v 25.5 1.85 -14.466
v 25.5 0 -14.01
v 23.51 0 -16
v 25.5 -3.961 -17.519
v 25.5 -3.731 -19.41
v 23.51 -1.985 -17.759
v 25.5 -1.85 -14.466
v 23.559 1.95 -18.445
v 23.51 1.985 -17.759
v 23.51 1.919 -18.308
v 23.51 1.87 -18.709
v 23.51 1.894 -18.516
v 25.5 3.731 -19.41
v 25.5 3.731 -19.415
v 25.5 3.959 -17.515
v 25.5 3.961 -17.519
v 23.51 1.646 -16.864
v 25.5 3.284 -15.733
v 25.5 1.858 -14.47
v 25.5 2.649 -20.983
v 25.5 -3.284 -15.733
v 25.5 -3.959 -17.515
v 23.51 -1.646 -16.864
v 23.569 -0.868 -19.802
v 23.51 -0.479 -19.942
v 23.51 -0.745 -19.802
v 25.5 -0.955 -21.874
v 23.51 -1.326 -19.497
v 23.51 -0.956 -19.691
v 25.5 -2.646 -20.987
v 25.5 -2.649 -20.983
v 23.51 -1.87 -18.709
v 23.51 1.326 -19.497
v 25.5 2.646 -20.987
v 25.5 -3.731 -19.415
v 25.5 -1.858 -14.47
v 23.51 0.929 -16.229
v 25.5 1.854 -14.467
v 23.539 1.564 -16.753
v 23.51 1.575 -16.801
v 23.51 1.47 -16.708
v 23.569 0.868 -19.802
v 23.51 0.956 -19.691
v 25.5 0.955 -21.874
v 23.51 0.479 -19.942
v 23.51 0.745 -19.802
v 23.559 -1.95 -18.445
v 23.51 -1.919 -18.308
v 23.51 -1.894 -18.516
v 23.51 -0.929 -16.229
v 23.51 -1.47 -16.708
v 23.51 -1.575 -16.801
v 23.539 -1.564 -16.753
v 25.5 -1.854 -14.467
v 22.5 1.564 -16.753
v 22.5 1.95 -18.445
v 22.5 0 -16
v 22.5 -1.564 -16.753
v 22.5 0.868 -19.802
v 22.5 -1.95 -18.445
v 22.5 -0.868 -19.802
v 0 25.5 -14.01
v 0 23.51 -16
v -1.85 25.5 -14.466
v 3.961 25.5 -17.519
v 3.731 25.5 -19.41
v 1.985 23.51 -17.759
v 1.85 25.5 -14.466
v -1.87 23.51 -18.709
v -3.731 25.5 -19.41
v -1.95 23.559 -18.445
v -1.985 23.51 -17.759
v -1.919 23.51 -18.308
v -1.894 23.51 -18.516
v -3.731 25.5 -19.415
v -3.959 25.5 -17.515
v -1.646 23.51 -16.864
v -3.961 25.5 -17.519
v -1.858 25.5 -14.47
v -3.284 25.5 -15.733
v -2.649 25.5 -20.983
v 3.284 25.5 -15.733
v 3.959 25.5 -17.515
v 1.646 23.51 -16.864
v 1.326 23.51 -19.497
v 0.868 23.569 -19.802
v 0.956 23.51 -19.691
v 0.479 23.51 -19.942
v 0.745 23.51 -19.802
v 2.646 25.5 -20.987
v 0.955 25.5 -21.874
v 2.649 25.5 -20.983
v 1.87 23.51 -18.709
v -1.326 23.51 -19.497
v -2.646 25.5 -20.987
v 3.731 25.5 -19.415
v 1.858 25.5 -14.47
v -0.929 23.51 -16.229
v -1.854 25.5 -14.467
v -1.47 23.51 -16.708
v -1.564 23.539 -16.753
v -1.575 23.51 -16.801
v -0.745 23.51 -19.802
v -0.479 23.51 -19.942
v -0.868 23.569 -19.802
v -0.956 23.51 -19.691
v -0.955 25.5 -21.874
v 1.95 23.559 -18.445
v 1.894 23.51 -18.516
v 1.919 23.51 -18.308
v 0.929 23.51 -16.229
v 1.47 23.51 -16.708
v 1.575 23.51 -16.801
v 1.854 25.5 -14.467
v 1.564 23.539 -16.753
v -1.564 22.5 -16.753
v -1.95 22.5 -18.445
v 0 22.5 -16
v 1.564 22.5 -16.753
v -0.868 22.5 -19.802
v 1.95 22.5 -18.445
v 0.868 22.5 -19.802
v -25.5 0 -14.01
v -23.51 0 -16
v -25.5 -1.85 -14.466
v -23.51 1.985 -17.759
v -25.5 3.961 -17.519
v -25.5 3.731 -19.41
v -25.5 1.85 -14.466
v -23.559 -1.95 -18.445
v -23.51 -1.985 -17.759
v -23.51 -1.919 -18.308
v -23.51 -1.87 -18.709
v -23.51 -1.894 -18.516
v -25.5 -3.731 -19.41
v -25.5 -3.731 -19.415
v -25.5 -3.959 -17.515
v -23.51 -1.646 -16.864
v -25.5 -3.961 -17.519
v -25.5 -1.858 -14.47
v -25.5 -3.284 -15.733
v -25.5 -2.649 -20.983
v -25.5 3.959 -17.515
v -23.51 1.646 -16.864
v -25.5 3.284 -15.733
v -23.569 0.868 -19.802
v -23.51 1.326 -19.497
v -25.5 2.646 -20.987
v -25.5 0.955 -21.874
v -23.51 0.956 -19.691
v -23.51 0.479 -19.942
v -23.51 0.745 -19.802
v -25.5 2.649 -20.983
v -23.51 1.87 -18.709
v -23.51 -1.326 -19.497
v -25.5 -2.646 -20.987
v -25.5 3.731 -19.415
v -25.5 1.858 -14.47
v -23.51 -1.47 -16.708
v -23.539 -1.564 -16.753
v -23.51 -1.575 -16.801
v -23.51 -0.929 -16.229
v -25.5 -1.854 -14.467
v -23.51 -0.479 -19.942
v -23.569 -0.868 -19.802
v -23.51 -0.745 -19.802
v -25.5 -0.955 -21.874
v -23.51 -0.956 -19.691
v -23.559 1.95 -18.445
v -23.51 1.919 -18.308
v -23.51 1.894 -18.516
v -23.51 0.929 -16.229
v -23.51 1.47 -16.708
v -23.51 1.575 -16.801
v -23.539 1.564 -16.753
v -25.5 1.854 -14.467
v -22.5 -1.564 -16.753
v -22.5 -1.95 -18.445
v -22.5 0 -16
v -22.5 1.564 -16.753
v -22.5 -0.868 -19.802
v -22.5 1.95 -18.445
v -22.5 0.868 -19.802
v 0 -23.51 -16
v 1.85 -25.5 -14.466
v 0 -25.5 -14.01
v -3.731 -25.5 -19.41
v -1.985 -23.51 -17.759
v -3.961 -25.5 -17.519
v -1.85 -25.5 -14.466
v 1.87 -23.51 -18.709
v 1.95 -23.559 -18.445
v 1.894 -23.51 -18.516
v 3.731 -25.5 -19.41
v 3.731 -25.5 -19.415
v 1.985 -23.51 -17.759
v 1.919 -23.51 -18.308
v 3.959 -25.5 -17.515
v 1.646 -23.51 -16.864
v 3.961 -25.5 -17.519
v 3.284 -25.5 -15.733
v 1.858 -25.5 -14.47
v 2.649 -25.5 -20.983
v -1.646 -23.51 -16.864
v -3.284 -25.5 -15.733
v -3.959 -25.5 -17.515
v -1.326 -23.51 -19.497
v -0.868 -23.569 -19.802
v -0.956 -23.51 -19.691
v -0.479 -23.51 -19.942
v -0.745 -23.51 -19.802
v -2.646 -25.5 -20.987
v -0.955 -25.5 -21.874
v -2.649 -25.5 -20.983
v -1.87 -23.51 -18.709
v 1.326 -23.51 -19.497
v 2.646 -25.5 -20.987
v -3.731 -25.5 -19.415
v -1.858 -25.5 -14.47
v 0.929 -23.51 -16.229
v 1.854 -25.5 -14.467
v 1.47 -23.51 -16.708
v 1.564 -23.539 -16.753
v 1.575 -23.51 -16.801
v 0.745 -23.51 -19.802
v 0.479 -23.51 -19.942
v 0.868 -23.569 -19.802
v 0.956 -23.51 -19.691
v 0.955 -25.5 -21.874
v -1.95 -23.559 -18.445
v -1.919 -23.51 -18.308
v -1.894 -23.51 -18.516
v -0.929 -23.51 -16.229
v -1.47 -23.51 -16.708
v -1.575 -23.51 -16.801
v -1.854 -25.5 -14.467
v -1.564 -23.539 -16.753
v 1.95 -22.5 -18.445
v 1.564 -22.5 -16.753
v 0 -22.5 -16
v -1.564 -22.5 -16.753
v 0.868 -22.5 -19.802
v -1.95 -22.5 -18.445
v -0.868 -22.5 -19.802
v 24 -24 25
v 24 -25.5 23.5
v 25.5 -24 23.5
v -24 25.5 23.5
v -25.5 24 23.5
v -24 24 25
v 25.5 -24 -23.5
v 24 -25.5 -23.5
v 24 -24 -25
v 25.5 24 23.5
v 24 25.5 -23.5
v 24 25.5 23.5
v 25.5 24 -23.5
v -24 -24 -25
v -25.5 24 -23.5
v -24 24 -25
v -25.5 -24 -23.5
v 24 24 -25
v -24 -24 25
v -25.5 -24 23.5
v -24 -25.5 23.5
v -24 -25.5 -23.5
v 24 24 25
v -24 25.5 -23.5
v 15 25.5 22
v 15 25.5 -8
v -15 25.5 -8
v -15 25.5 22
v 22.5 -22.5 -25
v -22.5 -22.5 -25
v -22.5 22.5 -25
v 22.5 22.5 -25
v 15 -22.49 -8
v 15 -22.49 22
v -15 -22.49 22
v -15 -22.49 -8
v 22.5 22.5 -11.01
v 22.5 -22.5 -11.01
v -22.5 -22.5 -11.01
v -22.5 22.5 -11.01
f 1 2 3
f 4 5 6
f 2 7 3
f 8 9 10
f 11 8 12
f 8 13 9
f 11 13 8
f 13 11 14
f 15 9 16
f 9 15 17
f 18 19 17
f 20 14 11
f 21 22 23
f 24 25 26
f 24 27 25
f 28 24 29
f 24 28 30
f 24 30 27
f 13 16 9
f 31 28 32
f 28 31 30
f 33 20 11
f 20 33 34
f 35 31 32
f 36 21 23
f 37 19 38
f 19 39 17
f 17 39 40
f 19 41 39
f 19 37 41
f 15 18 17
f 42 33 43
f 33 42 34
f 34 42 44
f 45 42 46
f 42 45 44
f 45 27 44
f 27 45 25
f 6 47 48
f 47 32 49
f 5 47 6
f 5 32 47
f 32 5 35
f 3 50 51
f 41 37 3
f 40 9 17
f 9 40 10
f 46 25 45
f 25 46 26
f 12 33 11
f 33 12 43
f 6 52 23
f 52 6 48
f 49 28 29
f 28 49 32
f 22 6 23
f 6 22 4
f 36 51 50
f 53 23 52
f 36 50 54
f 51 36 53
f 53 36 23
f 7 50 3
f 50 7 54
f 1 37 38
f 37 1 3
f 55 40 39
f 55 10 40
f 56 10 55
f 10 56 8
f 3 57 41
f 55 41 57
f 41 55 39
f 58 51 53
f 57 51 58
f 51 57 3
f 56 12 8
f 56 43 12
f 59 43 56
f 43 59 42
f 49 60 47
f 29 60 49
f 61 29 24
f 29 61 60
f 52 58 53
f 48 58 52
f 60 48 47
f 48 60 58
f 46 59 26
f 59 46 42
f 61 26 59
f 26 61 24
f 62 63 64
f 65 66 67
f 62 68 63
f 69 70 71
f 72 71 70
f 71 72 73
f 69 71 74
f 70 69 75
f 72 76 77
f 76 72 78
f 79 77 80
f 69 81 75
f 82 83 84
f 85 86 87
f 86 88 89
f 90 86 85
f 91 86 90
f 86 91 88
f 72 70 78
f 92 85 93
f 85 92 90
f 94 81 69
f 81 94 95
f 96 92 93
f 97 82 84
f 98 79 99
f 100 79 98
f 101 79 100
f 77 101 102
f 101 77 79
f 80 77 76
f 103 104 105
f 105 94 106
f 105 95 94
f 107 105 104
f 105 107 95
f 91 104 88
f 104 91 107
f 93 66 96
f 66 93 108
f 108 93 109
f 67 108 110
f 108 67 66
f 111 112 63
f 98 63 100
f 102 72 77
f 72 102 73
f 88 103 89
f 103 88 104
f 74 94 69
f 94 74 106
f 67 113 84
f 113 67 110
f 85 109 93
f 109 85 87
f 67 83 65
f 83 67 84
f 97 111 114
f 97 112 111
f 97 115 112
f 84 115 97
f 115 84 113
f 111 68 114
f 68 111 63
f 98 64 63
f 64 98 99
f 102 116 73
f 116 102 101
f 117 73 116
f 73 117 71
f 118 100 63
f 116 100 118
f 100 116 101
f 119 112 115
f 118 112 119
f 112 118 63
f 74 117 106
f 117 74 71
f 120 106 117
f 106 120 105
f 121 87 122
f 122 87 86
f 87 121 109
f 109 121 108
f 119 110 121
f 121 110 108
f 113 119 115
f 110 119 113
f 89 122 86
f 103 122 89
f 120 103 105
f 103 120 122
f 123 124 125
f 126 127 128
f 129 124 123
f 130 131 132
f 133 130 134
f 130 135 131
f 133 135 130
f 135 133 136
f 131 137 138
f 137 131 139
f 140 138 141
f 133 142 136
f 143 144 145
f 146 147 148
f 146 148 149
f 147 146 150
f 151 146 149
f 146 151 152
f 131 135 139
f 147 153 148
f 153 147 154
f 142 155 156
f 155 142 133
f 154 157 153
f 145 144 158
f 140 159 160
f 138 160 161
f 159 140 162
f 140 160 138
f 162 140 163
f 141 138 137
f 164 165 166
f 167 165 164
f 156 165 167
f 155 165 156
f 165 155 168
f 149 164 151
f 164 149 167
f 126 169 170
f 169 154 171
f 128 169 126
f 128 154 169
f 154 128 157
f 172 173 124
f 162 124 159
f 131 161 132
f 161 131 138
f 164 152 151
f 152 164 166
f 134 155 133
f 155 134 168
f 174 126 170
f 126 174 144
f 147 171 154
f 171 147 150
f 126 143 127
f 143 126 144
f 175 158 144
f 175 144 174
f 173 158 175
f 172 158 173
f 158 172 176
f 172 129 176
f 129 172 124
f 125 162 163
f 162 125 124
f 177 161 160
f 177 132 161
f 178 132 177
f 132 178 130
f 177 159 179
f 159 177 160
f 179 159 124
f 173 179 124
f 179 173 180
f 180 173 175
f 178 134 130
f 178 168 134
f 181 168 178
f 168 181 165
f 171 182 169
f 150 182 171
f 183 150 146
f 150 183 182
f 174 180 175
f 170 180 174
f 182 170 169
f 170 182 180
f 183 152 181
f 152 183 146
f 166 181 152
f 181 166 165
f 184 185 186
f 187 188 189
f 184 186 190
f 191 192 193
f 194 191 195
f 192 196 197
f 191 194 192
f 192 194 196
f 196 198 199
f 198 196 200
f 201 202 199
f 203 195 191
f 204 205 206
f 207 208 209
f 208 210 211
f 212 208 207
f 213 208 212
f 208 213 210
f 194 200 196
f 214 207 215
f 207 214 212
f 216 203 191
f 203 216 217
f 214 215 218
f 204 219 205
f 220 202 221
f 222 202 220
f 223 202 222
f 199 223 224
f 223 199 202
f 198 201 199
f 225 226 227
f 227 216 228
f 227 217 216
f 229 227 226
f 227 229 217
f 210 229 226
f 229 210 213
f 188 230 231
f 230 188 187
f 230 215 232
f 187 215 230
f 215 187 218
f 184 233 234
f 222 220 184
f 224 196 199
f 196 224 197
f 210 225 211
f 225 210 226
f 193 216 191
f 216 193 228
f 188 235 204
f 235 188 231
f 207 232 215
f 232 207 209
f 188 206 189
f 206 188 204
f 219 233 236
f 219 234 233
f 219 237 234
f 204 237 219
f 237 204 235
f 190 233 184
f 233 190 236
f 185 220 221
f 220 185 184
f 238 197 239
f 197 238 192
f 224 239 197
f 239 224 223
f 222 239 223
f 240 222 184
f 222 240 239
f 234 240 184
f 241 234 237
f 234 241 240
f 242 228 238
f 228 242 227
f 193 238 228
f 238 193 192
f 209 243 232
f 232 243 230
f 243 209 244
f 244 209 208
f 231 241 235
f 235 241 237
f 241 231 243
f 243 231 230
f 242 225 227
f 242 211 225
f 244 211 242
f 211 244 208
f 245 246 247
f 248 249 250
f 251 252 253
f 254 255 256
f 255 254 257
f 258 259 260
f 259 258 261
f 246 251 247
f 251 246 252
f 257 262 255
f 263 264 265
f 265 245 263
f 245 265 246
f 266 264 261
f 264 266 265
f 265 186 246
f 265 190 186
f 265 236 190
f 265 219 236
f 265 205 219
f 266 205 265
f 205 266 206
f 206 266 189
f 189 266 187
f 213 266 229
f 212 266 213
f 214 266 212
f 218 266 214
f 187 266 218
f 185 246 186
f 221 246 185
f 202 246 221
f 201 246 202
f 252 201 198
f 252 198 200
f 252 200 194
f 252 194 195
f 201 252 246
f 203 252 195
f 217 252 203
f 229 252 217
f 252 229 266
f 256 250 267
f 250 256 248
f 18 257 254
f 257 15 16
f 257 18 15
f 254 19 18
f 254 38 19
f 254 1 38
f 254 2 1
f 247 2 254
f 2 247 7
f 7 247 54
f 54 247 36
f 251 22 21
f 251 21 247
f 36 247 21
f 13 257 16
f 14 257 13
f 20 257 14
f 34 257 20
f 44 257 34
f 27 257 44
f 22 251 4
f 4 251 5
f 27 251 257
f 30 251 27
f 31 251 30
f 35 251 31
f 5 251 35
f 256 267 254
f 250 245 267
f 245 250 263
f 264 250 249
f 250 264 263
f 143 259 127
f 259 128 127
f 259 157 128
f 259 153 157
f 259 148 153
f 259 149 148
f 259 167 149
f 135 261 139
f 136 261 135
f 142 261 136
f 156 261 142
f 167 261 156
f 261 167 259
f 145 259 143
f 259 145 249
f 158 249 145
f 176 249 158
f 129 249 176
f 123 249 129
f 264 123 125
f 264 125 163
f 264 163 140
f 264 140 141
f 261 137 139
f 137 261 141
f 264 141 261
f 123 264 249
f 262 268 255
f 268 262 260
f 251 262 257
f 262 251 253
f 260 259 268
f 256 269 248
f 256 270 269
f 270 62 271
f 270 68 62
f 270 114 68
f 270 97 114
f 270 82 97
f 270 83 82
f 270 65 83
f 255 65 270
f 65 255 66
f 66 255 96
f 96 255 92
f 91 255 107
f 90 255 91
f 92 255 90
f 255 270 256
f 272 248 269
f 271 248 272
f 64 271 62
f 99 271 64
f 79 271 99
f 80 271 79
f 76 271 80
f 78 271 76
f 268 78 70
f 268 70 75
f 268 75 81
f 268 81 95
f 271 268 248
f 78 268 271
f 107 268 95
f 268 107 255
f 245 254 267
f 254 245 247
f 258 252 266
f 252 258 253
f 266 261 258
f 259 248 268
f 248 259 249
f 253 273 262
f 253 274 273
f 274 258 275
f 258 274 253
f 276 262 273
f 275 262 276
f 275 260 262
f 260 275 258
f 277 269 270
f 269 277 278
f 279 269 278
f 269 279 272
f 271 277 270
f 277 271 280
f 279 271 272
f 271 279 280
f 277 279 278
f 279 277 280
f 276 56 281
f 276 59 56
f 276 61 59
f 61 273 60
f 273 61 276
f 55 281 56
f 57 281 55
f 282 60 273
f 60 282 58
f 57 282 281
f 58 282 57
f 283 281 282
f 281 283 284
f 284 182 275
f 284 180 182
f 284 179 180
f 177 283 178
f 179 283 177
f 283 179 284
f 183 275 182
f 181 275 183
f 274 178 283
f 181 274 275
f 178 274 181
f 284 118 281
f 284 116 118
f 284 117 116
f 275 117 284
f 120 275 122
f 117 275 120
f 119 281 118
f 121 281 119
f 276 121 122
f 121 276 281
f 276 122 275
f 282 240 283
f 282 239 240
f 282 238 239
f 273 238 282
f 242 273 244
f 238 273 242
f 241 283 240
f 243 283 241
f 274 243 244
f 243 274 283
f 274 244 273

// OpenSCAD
BEAM = 45;

TUBE = 30;

WALL = 3;

SCREW = 4;

EPS = 0.01;

module mounting_bracket(
    beam=BEAM,
    tube=TUBE,
    wall=WALL,
    screw=SCREW) {

    beam_cutout_height = wall + 2 * screw + wall;
    height = beam_cutout_height + wall + tube + wall;
    width = max(tube, beam) + 2 * wall;

    chamfer = wall / 2;
        
    assert(wall >= screw / 2);

    module body() {
        hull() {
            cube([width, width - 2 * chamfer, height - 2 * chamfer], center=true);
            cube([width - 2 * chamfer, width, height - 2 * chamfer], center=true);
            cube([width - 2 * chamfer, width - 2 * chamfer, height], center=true);
        }
    }
    
    module screw(r, l) {
        assert(r <= l);
        translate([0,0,-l/2]) cylinder(r, r1=2*r, r2=r);
        cylinder(l, r=r, center=true);
    }
    
    difference() {
        body();
        
        // tube cutout
        translate([0,wall/2+EPS,height/2 - tube/2 - wall]) cube([tube,width-wall,tube], center=true);
        
        // beam cutout
        translate([0,0, -height/2 + beam_cutout_height/2 - EPS]) cube([beam, beam, beam_cutout_height], center=true);
        
        // screw holes
        for(a=[0:90:360])
            rotate(a) translate([width/2 - wall/2,0, -height/2 + wall + screw])
                rotate([0,-90,0])screw(screw/2, wall + 2*EPS);
    }

}

mounting_bracket();
